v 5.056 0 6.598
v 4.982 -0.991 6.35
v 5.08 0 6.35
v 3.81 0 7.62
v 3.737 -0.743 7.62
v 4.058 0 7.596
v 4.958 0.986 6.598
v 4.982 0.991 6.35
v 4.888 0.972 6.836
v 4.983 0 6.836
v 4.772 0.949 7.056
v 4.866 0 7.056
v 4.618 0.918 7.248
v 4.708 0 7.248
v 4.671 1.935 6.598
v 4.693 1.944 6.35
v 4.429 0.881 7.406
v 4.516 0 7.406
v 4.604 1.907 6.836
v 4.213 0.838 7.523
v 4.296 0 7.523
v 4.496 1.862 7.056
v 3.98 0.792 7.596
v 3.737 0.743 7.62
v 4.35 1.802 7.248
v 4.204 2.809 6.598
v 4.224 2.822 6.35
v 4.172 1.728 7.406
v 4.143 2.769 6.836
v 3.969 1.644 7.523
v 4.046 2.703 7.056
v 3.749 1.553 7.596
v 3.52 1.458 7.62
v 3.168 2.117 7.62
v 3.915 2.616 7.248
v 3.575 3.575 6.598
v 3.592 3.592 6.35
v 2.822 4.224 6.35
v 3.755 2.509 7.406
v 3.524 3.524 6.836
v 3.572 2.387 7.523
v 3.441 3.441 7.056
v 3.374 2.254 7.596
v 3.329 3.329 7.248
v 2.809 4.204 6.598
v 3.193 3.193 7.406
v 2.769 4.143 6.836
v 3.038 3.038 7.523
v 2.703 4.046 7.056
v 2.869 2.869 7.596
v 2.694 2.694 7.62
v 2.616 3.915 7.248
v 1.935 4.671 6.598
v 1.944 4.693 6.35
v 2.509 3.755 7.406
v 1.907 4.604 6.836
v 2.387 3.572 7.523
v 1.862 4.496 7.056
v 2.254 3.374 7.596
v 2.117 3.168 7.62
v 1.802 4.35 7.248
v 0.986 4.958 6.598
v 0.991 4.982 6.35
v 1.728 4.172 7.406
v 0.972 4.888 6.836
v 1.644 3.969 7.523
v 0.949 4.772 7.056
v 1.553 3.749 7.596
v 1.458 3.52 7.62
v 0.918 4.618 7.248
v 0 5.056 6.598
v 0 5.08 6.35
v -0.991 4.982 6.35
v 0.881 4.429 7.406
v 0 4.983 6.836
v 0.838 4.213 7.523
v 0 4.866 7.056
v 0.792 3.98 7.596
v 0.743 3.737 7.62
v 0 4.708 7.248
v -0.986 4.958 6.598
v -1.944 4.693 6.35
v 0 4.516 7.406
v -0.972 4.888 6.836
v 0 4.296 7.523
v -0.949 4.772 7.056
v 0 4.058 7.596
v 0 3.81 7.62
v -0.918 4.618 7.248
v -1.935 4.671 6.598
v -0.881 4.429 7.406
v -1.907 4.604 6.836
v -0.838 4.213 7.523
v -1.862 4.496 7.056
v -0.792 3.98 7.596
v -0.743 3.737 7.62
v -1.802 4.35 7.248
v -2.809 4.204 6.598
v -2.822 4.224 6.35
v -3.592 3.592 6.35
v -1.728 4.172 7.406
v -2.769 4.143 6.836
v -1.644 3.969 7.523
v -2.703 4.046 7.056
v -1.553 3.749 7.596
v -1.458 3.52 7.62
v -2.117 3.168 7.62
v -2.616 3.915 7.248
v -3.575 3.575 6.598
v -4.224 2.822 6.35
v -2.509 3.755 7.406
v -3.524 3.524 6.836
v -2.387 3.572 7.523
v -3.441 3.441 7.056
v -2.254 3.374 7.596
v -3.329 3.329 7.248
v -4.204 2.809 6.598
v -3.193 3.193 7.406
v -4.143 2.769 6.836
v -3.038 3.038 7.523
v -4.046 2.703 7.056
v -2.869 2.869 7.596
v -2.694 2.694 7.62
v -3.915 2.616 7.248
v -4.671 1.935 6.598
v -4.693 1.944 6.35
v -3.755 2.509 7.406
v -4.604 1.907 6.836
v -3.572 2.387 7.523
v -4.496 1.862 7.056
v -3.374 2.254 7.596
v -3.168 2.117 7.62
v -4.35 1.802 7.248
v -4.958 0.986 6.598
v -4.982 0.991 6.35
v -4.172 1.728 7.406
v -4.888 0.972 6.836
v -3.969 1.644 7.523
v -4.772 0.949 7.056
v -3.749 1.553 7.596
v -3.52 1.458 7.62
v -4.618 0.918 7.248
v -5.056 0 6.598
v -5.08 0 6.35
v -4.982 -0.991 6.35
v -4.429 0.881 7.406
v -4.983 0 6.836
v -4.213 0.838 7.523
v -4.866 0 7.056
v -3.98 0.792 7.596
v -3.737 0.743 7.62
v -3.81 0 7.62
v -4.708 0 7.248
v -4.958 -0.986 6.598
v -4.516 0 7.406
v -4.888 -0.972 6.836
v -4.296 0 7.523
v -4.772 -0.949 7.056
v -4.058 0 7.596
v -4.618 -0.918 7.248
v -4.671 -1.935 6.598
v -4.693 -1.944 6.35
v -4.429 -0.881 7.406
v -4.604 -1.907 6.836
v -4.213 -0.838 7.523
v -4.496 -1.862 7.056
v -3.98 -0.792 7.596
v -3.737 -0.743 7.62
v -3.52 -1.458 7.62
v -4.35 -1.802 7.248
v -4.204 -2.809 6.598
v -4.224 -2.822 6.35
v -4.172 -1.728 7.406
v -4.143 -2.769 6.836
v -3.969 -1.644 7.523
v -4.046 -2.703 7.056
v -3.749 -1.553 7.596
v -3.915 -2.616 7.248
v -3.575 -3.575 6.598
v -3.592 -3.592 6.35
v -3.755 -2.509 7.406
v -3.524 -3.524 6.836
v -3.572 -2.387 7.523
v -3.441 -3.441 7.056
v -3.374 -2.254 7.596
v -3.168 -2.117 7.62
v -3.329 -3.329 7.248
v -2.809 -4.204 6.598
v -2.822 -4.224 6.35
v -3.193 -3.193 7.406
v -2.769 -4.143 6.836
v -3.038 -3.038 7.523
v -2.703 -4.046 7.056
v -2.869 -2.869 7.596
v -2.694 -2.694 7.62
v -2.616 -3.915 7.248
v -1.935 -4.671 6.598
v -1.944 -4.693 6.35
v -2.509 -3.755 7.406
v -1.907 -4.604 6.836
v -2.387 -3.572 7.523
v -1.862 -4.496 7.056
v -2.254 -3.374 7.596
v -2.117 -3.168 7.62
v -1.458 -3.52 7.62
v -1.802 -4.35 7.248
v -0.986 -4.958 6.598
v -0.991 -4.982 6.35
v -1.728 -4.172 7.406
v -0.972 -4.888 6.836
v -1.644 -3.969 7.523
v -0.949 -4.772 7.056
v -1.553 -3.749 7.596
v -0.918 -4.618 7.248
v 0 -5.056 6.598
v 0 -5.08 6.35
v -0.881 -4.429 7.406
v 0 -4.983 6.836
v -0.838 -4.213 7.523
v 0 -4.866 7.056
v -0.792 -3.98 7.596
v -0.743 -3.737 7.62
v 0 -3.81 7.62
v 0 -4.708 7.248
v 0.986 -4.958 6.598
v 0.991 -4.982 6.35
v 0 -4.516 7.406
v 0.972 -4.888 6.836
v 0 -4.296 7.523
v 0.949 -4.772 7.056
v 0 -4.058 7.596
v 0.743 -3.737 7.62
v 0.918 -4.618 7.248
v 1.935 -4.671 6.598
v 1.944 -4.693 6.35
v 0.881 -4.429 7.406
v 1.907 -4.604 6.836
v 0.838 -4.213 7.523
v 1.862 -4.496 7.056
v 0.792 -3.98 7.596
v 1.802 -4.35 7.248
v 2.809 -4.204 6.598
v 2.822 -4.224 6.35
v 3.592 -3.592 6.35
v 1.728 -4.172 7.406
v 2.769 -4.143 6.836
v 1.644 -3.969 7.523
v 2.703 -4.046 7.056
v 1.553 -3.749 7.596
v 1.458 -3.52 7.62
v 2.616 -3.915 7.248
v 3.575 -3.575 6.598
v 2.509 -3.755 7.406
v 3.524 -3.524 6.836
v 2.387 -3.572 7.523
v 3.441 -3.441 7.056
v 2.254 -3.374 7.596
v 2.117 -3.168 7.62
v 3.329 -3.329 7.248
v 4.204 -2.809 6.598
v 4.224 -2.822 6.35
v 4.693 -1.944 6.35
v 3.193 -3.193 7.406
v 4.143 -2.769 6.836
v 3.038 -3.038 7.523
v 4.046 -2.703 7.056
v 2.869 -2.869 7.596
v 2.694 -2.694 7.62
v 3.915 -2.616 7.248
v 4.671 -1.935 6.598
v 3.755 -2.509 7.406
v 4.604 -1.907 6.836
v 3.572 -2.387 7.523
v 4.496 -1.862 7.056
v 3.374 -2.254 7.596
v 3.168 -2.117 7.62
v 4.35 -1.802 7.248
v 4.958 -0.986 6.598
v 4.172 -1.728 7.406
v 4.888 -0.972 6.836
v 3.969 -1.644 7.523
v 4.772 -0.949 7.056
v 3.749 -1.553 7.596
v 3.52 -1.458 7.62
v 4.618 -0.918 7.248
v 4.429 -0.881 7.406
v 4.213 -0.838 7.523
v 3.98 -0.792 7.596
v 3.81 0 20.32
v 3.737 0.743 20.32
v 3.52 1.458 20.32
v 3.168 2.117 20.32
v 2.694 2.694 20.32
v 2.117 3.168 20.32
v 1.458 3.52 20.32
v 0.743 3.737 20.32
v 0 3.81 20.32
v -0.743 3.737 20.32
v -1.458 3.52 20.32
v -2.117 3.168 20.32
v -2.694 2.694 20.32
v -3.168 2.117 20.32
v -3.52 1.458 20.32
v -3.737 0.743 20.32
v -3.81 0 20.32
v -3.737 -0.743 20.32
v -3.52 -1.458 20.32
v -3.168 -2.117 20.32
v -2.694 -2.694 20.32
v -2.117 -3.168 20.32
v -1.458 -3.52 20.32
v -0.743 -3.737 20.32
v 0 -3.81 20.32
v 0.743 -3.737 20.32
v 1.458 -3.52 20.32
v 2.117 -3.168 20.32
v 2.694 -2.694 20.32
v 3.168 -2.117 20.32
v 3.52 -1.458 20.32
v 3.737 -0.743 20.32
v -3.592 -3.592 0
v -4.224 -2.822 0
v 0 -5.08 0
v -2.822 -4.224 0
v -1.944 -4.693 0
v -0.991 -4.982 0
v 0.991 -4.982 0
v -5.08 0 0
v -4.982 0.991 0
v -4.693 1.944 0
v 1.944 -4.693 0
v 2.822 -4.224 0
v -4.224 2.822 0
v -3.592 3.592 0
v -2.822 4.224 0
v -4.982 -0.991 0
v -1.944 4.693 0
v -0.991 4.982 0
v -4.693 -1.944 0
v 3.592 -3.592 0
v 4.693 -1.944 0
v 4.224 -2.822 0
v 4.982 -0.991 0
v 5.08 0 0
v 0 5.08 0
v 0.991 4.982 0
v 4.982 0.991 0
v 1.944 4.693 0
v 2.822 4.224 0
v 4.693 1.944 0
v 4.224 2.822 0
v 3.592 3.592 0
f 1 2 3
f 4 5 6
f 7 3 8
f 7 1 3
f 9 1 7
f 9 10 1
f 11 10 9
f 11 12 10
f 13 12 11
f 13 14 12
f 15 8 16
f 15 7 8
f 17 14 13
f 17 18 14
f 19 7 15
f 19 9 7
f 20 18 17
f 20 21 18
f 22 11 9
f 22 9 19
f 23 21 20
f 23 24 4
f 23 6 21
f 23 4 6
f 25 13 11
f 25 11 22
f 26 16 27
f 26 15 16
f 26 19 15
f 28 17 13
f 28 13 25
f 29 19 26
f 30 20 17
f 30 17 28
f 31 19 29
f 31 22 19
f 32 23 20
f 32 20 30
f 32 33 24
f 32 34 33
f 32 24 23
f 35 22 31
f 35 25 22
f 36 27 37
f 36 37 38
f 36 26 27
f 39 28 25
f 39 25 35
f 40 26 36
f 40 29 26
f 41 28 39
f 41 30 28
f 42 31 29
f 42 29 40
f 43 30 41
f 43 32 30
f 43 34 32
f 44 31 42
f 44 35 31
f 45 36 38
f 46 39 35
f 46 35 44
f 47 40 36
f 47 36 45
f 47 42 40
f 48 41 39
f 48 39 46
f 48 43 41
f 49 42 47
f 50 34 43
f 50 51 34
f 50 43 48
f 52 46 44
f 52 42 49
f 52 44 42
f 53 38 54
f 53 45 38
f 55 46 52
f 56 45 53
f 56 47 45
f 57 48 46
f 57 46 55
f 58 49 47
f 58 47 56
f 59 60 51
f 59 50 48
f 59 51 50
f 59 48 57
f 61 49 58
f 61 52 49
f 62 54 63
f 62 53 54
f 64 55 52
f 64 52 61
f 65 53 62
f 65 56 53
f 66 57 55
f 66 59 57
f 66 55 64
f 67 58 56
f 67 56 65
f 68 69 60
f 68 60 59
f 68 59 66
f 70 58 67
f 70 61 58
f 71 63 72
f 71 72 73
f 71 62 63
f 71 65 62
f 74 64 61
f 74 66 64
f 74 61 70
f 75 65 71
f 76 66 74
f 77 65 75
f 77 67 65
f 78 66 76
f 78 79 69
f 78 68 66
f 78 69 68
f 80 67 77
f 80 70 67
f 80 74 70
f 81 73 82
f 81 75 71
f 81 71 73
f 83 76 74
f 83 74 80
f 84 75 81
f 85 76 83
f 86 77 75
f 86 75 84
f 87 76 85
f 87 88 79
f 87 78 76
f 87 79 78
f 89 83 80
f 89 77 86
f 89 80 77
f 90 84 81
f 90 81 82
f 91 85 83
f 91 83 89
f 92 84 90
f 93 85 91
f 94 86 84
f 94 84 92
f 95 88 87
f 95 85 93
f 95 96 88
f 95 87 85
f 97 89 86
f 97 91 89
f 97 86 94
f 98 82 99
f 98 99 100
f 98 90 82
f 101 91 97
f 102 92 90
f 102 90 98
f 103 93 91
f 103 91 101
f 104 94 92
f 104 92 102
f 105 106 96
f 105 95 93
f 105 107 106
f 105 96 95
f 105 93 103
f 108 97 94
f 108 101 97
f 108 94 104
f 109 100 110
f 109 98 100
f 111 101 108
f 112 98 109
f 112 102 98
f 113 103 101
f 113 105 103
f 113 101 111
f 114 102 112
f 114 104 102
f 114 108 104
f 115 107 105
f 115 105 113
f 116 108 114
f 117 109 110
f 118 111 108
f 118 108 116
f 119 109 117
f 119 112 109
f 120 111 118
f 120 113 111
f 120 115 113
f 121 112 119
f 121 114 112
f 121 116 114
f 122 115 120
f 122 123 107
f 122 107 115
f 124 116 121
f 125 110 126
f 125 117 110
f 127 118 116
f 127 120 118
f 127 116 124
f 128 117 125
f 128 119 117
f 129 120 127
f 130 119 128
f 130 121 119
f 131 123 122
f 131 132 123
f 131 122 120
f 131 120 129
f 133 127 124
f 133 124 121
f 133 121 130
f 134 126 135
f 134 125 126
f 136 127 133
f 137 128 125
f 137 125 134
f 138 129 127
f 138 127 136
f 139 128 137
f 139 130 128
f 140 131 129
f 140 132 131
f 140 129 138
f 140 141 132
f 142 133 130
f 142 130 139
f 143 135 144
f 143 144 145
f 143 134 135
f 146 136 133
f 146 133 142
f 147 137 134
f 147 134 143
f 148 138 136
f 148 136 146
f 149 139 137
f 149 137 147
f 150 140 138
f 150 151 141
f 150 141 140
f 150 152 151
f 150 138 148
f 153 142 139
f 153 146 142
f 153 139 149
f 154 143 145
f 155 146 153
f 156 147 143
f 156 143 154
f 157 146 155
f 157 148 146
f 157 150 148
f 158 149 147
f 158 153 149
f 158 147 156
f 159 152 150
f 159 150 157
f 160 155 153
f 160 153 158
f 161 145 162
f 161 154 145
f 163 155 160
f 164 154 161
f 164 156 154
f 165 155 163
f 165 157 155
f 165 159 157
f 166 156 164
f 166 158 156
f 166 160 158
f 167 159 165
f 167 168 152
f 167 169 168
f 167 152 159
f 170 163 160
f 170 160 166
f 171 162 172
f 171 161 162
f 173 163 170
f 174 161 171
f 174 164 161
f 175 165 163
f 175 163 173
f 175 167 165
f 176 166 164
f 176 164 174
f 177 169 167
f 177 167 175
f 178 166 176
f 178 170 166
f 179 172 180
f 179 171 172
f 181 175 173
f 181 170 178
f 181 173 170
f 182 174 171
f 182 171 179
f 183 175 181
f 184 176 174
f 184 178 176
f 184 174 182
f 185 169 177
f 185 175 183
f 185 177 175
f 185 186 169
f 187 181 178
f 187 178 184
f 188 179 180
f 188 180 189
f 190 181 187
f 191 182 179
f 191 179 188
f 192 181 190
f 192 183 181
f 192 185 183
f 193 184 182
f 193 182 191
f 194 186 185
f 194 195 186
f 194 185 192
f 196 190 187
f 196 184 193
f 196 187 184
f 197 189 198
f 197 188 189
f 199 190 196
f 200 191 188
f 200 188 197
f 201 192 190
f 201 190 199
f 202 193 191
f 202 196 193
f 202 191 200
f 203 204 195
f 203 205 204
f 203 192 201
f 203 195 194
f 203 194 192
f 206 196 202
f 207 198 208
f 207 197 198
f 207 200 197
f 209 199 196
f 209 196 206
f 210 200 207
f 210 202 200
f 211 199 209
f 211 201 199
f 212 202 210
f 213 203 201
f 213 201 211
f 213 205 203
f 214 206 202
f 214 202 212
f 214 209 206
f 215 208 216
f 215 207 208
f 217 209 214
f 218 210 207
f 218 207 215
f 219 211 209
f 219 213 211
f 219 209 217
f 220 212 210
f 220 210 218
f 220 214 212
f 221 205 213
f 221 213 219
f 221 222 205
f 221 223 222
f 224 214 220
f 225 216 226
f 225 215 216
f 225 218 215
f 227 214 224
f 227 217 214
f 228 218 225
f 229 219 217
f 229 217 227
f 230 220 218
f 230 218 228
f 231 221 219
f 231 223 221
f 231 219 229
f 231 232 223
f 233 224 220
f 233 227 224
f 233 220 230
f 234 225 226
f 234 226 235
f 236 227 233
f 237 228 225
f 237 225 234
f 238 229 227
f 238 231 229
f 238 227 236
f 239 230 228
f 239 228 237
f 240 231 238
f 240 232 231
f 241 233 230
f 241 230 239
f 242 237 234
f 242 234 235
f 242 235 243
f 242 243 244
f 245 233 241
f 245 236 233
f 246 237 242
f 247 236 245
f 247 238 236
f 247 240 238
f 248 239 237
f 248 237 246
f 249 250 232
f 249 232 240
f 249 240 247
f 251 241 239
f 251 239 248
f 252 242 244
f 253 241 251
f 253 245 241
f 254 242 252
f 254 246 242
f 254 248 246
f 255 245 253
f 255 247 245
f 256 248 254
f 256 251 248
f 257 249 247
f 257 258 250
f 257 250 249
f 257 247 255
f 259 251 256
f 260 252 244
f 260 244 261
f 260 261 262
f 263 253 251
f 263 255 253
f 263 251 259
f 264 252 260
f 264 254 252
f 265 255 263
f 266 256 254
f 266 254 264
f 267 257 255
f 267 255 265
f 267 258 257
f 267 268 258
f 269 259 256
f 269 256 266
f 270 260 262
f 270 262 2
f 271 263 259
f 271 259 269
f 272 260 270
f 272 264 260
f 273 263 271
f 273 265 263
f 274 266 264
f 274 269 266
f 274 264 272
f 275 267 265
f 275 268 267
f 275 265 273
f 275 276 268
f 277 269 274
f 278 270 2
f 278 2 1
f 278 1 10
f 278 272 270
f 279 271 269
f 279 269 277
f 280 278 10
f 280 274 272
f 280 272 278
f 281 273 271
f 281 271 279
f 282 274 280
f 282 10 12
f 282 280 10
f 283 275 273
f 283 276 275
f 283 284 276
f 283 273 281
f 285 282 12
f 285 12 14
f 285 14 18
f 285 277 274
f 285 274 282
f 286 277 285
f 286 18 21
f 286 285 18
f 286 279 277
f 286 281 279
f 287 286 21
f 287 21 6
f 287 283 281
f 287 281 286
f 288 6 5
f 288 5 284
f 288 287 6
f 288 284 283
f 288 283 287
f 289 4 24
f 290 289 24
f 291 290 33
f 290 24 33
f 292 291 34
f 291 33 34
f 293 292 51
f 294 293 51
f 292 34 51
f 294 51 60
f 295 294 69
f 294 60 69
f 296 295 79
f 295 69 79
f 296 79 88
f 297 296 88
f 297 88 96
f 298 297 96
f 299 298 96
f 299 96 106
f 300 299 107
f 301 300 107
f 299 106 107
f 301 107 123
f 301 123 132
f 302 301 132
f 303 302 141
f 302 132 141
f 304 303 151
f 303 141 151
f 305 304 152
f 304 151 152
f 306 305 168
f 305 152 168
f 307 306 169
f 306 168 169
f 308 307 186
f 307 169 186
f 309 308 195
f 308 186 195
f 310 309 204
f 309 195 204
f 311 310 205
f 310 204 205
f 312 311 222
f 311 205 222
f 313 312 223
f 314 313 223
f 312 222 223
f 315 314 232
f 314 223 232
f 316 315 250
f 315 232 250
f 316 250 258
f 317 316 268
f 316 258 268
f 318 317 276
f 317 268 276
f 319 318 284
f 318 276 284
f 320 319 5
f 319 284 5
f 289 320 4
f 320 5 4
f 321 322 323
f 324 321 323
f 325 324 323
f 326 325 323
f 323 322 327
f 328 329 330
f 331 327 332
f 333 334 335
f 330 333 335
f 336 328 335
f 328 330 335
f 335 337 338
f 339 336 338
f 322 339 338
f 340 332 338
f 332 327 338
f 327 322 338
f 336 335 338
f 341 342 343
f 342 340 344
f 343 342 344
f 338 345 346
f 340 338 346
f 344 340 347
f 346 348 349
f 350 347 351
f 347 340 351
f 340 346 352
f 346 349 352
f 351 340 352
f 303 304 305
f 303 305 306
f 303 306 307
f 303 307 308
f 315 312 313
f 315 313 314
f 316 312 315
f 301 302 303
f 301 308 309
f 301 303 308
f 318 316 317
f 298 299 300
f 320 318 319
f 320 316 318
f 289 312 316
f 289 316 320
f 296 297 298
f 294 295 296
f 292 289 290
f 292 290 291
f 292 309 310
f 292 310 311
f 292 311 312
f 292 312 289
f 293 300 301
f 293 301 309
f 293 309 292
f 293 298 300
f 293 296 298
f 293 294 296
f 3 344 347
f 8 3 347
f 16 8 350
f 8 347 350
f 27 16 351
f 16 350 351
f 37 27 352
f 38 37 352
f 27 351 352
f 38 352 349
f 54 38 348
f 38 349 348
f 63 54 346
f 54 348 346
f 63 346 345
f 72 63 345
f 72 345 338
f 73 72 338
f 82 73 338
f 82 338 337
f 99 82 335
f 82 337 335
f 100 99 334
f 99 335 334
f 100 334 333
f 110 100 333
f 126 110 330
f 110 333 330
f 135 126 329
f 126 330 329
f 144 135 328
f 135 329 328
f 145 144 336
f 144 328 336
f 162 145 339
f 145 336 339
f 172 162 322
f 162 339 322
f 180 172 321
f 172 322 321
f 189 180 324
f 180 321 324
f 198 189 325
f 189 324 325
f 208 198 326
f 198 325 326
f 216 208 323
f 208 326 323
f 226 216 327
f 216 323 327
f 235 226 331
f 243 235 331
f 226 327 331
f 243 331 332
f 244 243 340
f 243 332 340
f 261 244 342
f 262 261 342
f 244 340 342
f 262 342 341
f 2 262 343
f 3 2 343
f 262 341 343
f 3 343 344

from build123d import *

# Parameters (mm, degrees)
F0_R      = 5.08
F1_DEPTH  = 7.62
F2_R      = 1.27
F1_FACE_R = 3.81
F3_DEPTH  = 12.7


with BuildPart() as f1:
    # F0 (on Top) → F1 (new body)
    with BuildSketch(Plane.XY):
        Circle(F0_R)
    extrude(amount=F1_DEPTH)

    # F2
    f2_edges = [f1.edges().sort_by_distance(p)[0] for p in [
        (-5.08, 0, 7.62),
    ]]
    fillet(f2_edges, radius=F2_R)

    # F1_face (on face) → F3 (join)
    with BuildSketch(Plane.XY.offset(7.62)):
        Circle(F1_FACE_R)
    extrude(amount=F3_DEPTH)


solid = f1.part
